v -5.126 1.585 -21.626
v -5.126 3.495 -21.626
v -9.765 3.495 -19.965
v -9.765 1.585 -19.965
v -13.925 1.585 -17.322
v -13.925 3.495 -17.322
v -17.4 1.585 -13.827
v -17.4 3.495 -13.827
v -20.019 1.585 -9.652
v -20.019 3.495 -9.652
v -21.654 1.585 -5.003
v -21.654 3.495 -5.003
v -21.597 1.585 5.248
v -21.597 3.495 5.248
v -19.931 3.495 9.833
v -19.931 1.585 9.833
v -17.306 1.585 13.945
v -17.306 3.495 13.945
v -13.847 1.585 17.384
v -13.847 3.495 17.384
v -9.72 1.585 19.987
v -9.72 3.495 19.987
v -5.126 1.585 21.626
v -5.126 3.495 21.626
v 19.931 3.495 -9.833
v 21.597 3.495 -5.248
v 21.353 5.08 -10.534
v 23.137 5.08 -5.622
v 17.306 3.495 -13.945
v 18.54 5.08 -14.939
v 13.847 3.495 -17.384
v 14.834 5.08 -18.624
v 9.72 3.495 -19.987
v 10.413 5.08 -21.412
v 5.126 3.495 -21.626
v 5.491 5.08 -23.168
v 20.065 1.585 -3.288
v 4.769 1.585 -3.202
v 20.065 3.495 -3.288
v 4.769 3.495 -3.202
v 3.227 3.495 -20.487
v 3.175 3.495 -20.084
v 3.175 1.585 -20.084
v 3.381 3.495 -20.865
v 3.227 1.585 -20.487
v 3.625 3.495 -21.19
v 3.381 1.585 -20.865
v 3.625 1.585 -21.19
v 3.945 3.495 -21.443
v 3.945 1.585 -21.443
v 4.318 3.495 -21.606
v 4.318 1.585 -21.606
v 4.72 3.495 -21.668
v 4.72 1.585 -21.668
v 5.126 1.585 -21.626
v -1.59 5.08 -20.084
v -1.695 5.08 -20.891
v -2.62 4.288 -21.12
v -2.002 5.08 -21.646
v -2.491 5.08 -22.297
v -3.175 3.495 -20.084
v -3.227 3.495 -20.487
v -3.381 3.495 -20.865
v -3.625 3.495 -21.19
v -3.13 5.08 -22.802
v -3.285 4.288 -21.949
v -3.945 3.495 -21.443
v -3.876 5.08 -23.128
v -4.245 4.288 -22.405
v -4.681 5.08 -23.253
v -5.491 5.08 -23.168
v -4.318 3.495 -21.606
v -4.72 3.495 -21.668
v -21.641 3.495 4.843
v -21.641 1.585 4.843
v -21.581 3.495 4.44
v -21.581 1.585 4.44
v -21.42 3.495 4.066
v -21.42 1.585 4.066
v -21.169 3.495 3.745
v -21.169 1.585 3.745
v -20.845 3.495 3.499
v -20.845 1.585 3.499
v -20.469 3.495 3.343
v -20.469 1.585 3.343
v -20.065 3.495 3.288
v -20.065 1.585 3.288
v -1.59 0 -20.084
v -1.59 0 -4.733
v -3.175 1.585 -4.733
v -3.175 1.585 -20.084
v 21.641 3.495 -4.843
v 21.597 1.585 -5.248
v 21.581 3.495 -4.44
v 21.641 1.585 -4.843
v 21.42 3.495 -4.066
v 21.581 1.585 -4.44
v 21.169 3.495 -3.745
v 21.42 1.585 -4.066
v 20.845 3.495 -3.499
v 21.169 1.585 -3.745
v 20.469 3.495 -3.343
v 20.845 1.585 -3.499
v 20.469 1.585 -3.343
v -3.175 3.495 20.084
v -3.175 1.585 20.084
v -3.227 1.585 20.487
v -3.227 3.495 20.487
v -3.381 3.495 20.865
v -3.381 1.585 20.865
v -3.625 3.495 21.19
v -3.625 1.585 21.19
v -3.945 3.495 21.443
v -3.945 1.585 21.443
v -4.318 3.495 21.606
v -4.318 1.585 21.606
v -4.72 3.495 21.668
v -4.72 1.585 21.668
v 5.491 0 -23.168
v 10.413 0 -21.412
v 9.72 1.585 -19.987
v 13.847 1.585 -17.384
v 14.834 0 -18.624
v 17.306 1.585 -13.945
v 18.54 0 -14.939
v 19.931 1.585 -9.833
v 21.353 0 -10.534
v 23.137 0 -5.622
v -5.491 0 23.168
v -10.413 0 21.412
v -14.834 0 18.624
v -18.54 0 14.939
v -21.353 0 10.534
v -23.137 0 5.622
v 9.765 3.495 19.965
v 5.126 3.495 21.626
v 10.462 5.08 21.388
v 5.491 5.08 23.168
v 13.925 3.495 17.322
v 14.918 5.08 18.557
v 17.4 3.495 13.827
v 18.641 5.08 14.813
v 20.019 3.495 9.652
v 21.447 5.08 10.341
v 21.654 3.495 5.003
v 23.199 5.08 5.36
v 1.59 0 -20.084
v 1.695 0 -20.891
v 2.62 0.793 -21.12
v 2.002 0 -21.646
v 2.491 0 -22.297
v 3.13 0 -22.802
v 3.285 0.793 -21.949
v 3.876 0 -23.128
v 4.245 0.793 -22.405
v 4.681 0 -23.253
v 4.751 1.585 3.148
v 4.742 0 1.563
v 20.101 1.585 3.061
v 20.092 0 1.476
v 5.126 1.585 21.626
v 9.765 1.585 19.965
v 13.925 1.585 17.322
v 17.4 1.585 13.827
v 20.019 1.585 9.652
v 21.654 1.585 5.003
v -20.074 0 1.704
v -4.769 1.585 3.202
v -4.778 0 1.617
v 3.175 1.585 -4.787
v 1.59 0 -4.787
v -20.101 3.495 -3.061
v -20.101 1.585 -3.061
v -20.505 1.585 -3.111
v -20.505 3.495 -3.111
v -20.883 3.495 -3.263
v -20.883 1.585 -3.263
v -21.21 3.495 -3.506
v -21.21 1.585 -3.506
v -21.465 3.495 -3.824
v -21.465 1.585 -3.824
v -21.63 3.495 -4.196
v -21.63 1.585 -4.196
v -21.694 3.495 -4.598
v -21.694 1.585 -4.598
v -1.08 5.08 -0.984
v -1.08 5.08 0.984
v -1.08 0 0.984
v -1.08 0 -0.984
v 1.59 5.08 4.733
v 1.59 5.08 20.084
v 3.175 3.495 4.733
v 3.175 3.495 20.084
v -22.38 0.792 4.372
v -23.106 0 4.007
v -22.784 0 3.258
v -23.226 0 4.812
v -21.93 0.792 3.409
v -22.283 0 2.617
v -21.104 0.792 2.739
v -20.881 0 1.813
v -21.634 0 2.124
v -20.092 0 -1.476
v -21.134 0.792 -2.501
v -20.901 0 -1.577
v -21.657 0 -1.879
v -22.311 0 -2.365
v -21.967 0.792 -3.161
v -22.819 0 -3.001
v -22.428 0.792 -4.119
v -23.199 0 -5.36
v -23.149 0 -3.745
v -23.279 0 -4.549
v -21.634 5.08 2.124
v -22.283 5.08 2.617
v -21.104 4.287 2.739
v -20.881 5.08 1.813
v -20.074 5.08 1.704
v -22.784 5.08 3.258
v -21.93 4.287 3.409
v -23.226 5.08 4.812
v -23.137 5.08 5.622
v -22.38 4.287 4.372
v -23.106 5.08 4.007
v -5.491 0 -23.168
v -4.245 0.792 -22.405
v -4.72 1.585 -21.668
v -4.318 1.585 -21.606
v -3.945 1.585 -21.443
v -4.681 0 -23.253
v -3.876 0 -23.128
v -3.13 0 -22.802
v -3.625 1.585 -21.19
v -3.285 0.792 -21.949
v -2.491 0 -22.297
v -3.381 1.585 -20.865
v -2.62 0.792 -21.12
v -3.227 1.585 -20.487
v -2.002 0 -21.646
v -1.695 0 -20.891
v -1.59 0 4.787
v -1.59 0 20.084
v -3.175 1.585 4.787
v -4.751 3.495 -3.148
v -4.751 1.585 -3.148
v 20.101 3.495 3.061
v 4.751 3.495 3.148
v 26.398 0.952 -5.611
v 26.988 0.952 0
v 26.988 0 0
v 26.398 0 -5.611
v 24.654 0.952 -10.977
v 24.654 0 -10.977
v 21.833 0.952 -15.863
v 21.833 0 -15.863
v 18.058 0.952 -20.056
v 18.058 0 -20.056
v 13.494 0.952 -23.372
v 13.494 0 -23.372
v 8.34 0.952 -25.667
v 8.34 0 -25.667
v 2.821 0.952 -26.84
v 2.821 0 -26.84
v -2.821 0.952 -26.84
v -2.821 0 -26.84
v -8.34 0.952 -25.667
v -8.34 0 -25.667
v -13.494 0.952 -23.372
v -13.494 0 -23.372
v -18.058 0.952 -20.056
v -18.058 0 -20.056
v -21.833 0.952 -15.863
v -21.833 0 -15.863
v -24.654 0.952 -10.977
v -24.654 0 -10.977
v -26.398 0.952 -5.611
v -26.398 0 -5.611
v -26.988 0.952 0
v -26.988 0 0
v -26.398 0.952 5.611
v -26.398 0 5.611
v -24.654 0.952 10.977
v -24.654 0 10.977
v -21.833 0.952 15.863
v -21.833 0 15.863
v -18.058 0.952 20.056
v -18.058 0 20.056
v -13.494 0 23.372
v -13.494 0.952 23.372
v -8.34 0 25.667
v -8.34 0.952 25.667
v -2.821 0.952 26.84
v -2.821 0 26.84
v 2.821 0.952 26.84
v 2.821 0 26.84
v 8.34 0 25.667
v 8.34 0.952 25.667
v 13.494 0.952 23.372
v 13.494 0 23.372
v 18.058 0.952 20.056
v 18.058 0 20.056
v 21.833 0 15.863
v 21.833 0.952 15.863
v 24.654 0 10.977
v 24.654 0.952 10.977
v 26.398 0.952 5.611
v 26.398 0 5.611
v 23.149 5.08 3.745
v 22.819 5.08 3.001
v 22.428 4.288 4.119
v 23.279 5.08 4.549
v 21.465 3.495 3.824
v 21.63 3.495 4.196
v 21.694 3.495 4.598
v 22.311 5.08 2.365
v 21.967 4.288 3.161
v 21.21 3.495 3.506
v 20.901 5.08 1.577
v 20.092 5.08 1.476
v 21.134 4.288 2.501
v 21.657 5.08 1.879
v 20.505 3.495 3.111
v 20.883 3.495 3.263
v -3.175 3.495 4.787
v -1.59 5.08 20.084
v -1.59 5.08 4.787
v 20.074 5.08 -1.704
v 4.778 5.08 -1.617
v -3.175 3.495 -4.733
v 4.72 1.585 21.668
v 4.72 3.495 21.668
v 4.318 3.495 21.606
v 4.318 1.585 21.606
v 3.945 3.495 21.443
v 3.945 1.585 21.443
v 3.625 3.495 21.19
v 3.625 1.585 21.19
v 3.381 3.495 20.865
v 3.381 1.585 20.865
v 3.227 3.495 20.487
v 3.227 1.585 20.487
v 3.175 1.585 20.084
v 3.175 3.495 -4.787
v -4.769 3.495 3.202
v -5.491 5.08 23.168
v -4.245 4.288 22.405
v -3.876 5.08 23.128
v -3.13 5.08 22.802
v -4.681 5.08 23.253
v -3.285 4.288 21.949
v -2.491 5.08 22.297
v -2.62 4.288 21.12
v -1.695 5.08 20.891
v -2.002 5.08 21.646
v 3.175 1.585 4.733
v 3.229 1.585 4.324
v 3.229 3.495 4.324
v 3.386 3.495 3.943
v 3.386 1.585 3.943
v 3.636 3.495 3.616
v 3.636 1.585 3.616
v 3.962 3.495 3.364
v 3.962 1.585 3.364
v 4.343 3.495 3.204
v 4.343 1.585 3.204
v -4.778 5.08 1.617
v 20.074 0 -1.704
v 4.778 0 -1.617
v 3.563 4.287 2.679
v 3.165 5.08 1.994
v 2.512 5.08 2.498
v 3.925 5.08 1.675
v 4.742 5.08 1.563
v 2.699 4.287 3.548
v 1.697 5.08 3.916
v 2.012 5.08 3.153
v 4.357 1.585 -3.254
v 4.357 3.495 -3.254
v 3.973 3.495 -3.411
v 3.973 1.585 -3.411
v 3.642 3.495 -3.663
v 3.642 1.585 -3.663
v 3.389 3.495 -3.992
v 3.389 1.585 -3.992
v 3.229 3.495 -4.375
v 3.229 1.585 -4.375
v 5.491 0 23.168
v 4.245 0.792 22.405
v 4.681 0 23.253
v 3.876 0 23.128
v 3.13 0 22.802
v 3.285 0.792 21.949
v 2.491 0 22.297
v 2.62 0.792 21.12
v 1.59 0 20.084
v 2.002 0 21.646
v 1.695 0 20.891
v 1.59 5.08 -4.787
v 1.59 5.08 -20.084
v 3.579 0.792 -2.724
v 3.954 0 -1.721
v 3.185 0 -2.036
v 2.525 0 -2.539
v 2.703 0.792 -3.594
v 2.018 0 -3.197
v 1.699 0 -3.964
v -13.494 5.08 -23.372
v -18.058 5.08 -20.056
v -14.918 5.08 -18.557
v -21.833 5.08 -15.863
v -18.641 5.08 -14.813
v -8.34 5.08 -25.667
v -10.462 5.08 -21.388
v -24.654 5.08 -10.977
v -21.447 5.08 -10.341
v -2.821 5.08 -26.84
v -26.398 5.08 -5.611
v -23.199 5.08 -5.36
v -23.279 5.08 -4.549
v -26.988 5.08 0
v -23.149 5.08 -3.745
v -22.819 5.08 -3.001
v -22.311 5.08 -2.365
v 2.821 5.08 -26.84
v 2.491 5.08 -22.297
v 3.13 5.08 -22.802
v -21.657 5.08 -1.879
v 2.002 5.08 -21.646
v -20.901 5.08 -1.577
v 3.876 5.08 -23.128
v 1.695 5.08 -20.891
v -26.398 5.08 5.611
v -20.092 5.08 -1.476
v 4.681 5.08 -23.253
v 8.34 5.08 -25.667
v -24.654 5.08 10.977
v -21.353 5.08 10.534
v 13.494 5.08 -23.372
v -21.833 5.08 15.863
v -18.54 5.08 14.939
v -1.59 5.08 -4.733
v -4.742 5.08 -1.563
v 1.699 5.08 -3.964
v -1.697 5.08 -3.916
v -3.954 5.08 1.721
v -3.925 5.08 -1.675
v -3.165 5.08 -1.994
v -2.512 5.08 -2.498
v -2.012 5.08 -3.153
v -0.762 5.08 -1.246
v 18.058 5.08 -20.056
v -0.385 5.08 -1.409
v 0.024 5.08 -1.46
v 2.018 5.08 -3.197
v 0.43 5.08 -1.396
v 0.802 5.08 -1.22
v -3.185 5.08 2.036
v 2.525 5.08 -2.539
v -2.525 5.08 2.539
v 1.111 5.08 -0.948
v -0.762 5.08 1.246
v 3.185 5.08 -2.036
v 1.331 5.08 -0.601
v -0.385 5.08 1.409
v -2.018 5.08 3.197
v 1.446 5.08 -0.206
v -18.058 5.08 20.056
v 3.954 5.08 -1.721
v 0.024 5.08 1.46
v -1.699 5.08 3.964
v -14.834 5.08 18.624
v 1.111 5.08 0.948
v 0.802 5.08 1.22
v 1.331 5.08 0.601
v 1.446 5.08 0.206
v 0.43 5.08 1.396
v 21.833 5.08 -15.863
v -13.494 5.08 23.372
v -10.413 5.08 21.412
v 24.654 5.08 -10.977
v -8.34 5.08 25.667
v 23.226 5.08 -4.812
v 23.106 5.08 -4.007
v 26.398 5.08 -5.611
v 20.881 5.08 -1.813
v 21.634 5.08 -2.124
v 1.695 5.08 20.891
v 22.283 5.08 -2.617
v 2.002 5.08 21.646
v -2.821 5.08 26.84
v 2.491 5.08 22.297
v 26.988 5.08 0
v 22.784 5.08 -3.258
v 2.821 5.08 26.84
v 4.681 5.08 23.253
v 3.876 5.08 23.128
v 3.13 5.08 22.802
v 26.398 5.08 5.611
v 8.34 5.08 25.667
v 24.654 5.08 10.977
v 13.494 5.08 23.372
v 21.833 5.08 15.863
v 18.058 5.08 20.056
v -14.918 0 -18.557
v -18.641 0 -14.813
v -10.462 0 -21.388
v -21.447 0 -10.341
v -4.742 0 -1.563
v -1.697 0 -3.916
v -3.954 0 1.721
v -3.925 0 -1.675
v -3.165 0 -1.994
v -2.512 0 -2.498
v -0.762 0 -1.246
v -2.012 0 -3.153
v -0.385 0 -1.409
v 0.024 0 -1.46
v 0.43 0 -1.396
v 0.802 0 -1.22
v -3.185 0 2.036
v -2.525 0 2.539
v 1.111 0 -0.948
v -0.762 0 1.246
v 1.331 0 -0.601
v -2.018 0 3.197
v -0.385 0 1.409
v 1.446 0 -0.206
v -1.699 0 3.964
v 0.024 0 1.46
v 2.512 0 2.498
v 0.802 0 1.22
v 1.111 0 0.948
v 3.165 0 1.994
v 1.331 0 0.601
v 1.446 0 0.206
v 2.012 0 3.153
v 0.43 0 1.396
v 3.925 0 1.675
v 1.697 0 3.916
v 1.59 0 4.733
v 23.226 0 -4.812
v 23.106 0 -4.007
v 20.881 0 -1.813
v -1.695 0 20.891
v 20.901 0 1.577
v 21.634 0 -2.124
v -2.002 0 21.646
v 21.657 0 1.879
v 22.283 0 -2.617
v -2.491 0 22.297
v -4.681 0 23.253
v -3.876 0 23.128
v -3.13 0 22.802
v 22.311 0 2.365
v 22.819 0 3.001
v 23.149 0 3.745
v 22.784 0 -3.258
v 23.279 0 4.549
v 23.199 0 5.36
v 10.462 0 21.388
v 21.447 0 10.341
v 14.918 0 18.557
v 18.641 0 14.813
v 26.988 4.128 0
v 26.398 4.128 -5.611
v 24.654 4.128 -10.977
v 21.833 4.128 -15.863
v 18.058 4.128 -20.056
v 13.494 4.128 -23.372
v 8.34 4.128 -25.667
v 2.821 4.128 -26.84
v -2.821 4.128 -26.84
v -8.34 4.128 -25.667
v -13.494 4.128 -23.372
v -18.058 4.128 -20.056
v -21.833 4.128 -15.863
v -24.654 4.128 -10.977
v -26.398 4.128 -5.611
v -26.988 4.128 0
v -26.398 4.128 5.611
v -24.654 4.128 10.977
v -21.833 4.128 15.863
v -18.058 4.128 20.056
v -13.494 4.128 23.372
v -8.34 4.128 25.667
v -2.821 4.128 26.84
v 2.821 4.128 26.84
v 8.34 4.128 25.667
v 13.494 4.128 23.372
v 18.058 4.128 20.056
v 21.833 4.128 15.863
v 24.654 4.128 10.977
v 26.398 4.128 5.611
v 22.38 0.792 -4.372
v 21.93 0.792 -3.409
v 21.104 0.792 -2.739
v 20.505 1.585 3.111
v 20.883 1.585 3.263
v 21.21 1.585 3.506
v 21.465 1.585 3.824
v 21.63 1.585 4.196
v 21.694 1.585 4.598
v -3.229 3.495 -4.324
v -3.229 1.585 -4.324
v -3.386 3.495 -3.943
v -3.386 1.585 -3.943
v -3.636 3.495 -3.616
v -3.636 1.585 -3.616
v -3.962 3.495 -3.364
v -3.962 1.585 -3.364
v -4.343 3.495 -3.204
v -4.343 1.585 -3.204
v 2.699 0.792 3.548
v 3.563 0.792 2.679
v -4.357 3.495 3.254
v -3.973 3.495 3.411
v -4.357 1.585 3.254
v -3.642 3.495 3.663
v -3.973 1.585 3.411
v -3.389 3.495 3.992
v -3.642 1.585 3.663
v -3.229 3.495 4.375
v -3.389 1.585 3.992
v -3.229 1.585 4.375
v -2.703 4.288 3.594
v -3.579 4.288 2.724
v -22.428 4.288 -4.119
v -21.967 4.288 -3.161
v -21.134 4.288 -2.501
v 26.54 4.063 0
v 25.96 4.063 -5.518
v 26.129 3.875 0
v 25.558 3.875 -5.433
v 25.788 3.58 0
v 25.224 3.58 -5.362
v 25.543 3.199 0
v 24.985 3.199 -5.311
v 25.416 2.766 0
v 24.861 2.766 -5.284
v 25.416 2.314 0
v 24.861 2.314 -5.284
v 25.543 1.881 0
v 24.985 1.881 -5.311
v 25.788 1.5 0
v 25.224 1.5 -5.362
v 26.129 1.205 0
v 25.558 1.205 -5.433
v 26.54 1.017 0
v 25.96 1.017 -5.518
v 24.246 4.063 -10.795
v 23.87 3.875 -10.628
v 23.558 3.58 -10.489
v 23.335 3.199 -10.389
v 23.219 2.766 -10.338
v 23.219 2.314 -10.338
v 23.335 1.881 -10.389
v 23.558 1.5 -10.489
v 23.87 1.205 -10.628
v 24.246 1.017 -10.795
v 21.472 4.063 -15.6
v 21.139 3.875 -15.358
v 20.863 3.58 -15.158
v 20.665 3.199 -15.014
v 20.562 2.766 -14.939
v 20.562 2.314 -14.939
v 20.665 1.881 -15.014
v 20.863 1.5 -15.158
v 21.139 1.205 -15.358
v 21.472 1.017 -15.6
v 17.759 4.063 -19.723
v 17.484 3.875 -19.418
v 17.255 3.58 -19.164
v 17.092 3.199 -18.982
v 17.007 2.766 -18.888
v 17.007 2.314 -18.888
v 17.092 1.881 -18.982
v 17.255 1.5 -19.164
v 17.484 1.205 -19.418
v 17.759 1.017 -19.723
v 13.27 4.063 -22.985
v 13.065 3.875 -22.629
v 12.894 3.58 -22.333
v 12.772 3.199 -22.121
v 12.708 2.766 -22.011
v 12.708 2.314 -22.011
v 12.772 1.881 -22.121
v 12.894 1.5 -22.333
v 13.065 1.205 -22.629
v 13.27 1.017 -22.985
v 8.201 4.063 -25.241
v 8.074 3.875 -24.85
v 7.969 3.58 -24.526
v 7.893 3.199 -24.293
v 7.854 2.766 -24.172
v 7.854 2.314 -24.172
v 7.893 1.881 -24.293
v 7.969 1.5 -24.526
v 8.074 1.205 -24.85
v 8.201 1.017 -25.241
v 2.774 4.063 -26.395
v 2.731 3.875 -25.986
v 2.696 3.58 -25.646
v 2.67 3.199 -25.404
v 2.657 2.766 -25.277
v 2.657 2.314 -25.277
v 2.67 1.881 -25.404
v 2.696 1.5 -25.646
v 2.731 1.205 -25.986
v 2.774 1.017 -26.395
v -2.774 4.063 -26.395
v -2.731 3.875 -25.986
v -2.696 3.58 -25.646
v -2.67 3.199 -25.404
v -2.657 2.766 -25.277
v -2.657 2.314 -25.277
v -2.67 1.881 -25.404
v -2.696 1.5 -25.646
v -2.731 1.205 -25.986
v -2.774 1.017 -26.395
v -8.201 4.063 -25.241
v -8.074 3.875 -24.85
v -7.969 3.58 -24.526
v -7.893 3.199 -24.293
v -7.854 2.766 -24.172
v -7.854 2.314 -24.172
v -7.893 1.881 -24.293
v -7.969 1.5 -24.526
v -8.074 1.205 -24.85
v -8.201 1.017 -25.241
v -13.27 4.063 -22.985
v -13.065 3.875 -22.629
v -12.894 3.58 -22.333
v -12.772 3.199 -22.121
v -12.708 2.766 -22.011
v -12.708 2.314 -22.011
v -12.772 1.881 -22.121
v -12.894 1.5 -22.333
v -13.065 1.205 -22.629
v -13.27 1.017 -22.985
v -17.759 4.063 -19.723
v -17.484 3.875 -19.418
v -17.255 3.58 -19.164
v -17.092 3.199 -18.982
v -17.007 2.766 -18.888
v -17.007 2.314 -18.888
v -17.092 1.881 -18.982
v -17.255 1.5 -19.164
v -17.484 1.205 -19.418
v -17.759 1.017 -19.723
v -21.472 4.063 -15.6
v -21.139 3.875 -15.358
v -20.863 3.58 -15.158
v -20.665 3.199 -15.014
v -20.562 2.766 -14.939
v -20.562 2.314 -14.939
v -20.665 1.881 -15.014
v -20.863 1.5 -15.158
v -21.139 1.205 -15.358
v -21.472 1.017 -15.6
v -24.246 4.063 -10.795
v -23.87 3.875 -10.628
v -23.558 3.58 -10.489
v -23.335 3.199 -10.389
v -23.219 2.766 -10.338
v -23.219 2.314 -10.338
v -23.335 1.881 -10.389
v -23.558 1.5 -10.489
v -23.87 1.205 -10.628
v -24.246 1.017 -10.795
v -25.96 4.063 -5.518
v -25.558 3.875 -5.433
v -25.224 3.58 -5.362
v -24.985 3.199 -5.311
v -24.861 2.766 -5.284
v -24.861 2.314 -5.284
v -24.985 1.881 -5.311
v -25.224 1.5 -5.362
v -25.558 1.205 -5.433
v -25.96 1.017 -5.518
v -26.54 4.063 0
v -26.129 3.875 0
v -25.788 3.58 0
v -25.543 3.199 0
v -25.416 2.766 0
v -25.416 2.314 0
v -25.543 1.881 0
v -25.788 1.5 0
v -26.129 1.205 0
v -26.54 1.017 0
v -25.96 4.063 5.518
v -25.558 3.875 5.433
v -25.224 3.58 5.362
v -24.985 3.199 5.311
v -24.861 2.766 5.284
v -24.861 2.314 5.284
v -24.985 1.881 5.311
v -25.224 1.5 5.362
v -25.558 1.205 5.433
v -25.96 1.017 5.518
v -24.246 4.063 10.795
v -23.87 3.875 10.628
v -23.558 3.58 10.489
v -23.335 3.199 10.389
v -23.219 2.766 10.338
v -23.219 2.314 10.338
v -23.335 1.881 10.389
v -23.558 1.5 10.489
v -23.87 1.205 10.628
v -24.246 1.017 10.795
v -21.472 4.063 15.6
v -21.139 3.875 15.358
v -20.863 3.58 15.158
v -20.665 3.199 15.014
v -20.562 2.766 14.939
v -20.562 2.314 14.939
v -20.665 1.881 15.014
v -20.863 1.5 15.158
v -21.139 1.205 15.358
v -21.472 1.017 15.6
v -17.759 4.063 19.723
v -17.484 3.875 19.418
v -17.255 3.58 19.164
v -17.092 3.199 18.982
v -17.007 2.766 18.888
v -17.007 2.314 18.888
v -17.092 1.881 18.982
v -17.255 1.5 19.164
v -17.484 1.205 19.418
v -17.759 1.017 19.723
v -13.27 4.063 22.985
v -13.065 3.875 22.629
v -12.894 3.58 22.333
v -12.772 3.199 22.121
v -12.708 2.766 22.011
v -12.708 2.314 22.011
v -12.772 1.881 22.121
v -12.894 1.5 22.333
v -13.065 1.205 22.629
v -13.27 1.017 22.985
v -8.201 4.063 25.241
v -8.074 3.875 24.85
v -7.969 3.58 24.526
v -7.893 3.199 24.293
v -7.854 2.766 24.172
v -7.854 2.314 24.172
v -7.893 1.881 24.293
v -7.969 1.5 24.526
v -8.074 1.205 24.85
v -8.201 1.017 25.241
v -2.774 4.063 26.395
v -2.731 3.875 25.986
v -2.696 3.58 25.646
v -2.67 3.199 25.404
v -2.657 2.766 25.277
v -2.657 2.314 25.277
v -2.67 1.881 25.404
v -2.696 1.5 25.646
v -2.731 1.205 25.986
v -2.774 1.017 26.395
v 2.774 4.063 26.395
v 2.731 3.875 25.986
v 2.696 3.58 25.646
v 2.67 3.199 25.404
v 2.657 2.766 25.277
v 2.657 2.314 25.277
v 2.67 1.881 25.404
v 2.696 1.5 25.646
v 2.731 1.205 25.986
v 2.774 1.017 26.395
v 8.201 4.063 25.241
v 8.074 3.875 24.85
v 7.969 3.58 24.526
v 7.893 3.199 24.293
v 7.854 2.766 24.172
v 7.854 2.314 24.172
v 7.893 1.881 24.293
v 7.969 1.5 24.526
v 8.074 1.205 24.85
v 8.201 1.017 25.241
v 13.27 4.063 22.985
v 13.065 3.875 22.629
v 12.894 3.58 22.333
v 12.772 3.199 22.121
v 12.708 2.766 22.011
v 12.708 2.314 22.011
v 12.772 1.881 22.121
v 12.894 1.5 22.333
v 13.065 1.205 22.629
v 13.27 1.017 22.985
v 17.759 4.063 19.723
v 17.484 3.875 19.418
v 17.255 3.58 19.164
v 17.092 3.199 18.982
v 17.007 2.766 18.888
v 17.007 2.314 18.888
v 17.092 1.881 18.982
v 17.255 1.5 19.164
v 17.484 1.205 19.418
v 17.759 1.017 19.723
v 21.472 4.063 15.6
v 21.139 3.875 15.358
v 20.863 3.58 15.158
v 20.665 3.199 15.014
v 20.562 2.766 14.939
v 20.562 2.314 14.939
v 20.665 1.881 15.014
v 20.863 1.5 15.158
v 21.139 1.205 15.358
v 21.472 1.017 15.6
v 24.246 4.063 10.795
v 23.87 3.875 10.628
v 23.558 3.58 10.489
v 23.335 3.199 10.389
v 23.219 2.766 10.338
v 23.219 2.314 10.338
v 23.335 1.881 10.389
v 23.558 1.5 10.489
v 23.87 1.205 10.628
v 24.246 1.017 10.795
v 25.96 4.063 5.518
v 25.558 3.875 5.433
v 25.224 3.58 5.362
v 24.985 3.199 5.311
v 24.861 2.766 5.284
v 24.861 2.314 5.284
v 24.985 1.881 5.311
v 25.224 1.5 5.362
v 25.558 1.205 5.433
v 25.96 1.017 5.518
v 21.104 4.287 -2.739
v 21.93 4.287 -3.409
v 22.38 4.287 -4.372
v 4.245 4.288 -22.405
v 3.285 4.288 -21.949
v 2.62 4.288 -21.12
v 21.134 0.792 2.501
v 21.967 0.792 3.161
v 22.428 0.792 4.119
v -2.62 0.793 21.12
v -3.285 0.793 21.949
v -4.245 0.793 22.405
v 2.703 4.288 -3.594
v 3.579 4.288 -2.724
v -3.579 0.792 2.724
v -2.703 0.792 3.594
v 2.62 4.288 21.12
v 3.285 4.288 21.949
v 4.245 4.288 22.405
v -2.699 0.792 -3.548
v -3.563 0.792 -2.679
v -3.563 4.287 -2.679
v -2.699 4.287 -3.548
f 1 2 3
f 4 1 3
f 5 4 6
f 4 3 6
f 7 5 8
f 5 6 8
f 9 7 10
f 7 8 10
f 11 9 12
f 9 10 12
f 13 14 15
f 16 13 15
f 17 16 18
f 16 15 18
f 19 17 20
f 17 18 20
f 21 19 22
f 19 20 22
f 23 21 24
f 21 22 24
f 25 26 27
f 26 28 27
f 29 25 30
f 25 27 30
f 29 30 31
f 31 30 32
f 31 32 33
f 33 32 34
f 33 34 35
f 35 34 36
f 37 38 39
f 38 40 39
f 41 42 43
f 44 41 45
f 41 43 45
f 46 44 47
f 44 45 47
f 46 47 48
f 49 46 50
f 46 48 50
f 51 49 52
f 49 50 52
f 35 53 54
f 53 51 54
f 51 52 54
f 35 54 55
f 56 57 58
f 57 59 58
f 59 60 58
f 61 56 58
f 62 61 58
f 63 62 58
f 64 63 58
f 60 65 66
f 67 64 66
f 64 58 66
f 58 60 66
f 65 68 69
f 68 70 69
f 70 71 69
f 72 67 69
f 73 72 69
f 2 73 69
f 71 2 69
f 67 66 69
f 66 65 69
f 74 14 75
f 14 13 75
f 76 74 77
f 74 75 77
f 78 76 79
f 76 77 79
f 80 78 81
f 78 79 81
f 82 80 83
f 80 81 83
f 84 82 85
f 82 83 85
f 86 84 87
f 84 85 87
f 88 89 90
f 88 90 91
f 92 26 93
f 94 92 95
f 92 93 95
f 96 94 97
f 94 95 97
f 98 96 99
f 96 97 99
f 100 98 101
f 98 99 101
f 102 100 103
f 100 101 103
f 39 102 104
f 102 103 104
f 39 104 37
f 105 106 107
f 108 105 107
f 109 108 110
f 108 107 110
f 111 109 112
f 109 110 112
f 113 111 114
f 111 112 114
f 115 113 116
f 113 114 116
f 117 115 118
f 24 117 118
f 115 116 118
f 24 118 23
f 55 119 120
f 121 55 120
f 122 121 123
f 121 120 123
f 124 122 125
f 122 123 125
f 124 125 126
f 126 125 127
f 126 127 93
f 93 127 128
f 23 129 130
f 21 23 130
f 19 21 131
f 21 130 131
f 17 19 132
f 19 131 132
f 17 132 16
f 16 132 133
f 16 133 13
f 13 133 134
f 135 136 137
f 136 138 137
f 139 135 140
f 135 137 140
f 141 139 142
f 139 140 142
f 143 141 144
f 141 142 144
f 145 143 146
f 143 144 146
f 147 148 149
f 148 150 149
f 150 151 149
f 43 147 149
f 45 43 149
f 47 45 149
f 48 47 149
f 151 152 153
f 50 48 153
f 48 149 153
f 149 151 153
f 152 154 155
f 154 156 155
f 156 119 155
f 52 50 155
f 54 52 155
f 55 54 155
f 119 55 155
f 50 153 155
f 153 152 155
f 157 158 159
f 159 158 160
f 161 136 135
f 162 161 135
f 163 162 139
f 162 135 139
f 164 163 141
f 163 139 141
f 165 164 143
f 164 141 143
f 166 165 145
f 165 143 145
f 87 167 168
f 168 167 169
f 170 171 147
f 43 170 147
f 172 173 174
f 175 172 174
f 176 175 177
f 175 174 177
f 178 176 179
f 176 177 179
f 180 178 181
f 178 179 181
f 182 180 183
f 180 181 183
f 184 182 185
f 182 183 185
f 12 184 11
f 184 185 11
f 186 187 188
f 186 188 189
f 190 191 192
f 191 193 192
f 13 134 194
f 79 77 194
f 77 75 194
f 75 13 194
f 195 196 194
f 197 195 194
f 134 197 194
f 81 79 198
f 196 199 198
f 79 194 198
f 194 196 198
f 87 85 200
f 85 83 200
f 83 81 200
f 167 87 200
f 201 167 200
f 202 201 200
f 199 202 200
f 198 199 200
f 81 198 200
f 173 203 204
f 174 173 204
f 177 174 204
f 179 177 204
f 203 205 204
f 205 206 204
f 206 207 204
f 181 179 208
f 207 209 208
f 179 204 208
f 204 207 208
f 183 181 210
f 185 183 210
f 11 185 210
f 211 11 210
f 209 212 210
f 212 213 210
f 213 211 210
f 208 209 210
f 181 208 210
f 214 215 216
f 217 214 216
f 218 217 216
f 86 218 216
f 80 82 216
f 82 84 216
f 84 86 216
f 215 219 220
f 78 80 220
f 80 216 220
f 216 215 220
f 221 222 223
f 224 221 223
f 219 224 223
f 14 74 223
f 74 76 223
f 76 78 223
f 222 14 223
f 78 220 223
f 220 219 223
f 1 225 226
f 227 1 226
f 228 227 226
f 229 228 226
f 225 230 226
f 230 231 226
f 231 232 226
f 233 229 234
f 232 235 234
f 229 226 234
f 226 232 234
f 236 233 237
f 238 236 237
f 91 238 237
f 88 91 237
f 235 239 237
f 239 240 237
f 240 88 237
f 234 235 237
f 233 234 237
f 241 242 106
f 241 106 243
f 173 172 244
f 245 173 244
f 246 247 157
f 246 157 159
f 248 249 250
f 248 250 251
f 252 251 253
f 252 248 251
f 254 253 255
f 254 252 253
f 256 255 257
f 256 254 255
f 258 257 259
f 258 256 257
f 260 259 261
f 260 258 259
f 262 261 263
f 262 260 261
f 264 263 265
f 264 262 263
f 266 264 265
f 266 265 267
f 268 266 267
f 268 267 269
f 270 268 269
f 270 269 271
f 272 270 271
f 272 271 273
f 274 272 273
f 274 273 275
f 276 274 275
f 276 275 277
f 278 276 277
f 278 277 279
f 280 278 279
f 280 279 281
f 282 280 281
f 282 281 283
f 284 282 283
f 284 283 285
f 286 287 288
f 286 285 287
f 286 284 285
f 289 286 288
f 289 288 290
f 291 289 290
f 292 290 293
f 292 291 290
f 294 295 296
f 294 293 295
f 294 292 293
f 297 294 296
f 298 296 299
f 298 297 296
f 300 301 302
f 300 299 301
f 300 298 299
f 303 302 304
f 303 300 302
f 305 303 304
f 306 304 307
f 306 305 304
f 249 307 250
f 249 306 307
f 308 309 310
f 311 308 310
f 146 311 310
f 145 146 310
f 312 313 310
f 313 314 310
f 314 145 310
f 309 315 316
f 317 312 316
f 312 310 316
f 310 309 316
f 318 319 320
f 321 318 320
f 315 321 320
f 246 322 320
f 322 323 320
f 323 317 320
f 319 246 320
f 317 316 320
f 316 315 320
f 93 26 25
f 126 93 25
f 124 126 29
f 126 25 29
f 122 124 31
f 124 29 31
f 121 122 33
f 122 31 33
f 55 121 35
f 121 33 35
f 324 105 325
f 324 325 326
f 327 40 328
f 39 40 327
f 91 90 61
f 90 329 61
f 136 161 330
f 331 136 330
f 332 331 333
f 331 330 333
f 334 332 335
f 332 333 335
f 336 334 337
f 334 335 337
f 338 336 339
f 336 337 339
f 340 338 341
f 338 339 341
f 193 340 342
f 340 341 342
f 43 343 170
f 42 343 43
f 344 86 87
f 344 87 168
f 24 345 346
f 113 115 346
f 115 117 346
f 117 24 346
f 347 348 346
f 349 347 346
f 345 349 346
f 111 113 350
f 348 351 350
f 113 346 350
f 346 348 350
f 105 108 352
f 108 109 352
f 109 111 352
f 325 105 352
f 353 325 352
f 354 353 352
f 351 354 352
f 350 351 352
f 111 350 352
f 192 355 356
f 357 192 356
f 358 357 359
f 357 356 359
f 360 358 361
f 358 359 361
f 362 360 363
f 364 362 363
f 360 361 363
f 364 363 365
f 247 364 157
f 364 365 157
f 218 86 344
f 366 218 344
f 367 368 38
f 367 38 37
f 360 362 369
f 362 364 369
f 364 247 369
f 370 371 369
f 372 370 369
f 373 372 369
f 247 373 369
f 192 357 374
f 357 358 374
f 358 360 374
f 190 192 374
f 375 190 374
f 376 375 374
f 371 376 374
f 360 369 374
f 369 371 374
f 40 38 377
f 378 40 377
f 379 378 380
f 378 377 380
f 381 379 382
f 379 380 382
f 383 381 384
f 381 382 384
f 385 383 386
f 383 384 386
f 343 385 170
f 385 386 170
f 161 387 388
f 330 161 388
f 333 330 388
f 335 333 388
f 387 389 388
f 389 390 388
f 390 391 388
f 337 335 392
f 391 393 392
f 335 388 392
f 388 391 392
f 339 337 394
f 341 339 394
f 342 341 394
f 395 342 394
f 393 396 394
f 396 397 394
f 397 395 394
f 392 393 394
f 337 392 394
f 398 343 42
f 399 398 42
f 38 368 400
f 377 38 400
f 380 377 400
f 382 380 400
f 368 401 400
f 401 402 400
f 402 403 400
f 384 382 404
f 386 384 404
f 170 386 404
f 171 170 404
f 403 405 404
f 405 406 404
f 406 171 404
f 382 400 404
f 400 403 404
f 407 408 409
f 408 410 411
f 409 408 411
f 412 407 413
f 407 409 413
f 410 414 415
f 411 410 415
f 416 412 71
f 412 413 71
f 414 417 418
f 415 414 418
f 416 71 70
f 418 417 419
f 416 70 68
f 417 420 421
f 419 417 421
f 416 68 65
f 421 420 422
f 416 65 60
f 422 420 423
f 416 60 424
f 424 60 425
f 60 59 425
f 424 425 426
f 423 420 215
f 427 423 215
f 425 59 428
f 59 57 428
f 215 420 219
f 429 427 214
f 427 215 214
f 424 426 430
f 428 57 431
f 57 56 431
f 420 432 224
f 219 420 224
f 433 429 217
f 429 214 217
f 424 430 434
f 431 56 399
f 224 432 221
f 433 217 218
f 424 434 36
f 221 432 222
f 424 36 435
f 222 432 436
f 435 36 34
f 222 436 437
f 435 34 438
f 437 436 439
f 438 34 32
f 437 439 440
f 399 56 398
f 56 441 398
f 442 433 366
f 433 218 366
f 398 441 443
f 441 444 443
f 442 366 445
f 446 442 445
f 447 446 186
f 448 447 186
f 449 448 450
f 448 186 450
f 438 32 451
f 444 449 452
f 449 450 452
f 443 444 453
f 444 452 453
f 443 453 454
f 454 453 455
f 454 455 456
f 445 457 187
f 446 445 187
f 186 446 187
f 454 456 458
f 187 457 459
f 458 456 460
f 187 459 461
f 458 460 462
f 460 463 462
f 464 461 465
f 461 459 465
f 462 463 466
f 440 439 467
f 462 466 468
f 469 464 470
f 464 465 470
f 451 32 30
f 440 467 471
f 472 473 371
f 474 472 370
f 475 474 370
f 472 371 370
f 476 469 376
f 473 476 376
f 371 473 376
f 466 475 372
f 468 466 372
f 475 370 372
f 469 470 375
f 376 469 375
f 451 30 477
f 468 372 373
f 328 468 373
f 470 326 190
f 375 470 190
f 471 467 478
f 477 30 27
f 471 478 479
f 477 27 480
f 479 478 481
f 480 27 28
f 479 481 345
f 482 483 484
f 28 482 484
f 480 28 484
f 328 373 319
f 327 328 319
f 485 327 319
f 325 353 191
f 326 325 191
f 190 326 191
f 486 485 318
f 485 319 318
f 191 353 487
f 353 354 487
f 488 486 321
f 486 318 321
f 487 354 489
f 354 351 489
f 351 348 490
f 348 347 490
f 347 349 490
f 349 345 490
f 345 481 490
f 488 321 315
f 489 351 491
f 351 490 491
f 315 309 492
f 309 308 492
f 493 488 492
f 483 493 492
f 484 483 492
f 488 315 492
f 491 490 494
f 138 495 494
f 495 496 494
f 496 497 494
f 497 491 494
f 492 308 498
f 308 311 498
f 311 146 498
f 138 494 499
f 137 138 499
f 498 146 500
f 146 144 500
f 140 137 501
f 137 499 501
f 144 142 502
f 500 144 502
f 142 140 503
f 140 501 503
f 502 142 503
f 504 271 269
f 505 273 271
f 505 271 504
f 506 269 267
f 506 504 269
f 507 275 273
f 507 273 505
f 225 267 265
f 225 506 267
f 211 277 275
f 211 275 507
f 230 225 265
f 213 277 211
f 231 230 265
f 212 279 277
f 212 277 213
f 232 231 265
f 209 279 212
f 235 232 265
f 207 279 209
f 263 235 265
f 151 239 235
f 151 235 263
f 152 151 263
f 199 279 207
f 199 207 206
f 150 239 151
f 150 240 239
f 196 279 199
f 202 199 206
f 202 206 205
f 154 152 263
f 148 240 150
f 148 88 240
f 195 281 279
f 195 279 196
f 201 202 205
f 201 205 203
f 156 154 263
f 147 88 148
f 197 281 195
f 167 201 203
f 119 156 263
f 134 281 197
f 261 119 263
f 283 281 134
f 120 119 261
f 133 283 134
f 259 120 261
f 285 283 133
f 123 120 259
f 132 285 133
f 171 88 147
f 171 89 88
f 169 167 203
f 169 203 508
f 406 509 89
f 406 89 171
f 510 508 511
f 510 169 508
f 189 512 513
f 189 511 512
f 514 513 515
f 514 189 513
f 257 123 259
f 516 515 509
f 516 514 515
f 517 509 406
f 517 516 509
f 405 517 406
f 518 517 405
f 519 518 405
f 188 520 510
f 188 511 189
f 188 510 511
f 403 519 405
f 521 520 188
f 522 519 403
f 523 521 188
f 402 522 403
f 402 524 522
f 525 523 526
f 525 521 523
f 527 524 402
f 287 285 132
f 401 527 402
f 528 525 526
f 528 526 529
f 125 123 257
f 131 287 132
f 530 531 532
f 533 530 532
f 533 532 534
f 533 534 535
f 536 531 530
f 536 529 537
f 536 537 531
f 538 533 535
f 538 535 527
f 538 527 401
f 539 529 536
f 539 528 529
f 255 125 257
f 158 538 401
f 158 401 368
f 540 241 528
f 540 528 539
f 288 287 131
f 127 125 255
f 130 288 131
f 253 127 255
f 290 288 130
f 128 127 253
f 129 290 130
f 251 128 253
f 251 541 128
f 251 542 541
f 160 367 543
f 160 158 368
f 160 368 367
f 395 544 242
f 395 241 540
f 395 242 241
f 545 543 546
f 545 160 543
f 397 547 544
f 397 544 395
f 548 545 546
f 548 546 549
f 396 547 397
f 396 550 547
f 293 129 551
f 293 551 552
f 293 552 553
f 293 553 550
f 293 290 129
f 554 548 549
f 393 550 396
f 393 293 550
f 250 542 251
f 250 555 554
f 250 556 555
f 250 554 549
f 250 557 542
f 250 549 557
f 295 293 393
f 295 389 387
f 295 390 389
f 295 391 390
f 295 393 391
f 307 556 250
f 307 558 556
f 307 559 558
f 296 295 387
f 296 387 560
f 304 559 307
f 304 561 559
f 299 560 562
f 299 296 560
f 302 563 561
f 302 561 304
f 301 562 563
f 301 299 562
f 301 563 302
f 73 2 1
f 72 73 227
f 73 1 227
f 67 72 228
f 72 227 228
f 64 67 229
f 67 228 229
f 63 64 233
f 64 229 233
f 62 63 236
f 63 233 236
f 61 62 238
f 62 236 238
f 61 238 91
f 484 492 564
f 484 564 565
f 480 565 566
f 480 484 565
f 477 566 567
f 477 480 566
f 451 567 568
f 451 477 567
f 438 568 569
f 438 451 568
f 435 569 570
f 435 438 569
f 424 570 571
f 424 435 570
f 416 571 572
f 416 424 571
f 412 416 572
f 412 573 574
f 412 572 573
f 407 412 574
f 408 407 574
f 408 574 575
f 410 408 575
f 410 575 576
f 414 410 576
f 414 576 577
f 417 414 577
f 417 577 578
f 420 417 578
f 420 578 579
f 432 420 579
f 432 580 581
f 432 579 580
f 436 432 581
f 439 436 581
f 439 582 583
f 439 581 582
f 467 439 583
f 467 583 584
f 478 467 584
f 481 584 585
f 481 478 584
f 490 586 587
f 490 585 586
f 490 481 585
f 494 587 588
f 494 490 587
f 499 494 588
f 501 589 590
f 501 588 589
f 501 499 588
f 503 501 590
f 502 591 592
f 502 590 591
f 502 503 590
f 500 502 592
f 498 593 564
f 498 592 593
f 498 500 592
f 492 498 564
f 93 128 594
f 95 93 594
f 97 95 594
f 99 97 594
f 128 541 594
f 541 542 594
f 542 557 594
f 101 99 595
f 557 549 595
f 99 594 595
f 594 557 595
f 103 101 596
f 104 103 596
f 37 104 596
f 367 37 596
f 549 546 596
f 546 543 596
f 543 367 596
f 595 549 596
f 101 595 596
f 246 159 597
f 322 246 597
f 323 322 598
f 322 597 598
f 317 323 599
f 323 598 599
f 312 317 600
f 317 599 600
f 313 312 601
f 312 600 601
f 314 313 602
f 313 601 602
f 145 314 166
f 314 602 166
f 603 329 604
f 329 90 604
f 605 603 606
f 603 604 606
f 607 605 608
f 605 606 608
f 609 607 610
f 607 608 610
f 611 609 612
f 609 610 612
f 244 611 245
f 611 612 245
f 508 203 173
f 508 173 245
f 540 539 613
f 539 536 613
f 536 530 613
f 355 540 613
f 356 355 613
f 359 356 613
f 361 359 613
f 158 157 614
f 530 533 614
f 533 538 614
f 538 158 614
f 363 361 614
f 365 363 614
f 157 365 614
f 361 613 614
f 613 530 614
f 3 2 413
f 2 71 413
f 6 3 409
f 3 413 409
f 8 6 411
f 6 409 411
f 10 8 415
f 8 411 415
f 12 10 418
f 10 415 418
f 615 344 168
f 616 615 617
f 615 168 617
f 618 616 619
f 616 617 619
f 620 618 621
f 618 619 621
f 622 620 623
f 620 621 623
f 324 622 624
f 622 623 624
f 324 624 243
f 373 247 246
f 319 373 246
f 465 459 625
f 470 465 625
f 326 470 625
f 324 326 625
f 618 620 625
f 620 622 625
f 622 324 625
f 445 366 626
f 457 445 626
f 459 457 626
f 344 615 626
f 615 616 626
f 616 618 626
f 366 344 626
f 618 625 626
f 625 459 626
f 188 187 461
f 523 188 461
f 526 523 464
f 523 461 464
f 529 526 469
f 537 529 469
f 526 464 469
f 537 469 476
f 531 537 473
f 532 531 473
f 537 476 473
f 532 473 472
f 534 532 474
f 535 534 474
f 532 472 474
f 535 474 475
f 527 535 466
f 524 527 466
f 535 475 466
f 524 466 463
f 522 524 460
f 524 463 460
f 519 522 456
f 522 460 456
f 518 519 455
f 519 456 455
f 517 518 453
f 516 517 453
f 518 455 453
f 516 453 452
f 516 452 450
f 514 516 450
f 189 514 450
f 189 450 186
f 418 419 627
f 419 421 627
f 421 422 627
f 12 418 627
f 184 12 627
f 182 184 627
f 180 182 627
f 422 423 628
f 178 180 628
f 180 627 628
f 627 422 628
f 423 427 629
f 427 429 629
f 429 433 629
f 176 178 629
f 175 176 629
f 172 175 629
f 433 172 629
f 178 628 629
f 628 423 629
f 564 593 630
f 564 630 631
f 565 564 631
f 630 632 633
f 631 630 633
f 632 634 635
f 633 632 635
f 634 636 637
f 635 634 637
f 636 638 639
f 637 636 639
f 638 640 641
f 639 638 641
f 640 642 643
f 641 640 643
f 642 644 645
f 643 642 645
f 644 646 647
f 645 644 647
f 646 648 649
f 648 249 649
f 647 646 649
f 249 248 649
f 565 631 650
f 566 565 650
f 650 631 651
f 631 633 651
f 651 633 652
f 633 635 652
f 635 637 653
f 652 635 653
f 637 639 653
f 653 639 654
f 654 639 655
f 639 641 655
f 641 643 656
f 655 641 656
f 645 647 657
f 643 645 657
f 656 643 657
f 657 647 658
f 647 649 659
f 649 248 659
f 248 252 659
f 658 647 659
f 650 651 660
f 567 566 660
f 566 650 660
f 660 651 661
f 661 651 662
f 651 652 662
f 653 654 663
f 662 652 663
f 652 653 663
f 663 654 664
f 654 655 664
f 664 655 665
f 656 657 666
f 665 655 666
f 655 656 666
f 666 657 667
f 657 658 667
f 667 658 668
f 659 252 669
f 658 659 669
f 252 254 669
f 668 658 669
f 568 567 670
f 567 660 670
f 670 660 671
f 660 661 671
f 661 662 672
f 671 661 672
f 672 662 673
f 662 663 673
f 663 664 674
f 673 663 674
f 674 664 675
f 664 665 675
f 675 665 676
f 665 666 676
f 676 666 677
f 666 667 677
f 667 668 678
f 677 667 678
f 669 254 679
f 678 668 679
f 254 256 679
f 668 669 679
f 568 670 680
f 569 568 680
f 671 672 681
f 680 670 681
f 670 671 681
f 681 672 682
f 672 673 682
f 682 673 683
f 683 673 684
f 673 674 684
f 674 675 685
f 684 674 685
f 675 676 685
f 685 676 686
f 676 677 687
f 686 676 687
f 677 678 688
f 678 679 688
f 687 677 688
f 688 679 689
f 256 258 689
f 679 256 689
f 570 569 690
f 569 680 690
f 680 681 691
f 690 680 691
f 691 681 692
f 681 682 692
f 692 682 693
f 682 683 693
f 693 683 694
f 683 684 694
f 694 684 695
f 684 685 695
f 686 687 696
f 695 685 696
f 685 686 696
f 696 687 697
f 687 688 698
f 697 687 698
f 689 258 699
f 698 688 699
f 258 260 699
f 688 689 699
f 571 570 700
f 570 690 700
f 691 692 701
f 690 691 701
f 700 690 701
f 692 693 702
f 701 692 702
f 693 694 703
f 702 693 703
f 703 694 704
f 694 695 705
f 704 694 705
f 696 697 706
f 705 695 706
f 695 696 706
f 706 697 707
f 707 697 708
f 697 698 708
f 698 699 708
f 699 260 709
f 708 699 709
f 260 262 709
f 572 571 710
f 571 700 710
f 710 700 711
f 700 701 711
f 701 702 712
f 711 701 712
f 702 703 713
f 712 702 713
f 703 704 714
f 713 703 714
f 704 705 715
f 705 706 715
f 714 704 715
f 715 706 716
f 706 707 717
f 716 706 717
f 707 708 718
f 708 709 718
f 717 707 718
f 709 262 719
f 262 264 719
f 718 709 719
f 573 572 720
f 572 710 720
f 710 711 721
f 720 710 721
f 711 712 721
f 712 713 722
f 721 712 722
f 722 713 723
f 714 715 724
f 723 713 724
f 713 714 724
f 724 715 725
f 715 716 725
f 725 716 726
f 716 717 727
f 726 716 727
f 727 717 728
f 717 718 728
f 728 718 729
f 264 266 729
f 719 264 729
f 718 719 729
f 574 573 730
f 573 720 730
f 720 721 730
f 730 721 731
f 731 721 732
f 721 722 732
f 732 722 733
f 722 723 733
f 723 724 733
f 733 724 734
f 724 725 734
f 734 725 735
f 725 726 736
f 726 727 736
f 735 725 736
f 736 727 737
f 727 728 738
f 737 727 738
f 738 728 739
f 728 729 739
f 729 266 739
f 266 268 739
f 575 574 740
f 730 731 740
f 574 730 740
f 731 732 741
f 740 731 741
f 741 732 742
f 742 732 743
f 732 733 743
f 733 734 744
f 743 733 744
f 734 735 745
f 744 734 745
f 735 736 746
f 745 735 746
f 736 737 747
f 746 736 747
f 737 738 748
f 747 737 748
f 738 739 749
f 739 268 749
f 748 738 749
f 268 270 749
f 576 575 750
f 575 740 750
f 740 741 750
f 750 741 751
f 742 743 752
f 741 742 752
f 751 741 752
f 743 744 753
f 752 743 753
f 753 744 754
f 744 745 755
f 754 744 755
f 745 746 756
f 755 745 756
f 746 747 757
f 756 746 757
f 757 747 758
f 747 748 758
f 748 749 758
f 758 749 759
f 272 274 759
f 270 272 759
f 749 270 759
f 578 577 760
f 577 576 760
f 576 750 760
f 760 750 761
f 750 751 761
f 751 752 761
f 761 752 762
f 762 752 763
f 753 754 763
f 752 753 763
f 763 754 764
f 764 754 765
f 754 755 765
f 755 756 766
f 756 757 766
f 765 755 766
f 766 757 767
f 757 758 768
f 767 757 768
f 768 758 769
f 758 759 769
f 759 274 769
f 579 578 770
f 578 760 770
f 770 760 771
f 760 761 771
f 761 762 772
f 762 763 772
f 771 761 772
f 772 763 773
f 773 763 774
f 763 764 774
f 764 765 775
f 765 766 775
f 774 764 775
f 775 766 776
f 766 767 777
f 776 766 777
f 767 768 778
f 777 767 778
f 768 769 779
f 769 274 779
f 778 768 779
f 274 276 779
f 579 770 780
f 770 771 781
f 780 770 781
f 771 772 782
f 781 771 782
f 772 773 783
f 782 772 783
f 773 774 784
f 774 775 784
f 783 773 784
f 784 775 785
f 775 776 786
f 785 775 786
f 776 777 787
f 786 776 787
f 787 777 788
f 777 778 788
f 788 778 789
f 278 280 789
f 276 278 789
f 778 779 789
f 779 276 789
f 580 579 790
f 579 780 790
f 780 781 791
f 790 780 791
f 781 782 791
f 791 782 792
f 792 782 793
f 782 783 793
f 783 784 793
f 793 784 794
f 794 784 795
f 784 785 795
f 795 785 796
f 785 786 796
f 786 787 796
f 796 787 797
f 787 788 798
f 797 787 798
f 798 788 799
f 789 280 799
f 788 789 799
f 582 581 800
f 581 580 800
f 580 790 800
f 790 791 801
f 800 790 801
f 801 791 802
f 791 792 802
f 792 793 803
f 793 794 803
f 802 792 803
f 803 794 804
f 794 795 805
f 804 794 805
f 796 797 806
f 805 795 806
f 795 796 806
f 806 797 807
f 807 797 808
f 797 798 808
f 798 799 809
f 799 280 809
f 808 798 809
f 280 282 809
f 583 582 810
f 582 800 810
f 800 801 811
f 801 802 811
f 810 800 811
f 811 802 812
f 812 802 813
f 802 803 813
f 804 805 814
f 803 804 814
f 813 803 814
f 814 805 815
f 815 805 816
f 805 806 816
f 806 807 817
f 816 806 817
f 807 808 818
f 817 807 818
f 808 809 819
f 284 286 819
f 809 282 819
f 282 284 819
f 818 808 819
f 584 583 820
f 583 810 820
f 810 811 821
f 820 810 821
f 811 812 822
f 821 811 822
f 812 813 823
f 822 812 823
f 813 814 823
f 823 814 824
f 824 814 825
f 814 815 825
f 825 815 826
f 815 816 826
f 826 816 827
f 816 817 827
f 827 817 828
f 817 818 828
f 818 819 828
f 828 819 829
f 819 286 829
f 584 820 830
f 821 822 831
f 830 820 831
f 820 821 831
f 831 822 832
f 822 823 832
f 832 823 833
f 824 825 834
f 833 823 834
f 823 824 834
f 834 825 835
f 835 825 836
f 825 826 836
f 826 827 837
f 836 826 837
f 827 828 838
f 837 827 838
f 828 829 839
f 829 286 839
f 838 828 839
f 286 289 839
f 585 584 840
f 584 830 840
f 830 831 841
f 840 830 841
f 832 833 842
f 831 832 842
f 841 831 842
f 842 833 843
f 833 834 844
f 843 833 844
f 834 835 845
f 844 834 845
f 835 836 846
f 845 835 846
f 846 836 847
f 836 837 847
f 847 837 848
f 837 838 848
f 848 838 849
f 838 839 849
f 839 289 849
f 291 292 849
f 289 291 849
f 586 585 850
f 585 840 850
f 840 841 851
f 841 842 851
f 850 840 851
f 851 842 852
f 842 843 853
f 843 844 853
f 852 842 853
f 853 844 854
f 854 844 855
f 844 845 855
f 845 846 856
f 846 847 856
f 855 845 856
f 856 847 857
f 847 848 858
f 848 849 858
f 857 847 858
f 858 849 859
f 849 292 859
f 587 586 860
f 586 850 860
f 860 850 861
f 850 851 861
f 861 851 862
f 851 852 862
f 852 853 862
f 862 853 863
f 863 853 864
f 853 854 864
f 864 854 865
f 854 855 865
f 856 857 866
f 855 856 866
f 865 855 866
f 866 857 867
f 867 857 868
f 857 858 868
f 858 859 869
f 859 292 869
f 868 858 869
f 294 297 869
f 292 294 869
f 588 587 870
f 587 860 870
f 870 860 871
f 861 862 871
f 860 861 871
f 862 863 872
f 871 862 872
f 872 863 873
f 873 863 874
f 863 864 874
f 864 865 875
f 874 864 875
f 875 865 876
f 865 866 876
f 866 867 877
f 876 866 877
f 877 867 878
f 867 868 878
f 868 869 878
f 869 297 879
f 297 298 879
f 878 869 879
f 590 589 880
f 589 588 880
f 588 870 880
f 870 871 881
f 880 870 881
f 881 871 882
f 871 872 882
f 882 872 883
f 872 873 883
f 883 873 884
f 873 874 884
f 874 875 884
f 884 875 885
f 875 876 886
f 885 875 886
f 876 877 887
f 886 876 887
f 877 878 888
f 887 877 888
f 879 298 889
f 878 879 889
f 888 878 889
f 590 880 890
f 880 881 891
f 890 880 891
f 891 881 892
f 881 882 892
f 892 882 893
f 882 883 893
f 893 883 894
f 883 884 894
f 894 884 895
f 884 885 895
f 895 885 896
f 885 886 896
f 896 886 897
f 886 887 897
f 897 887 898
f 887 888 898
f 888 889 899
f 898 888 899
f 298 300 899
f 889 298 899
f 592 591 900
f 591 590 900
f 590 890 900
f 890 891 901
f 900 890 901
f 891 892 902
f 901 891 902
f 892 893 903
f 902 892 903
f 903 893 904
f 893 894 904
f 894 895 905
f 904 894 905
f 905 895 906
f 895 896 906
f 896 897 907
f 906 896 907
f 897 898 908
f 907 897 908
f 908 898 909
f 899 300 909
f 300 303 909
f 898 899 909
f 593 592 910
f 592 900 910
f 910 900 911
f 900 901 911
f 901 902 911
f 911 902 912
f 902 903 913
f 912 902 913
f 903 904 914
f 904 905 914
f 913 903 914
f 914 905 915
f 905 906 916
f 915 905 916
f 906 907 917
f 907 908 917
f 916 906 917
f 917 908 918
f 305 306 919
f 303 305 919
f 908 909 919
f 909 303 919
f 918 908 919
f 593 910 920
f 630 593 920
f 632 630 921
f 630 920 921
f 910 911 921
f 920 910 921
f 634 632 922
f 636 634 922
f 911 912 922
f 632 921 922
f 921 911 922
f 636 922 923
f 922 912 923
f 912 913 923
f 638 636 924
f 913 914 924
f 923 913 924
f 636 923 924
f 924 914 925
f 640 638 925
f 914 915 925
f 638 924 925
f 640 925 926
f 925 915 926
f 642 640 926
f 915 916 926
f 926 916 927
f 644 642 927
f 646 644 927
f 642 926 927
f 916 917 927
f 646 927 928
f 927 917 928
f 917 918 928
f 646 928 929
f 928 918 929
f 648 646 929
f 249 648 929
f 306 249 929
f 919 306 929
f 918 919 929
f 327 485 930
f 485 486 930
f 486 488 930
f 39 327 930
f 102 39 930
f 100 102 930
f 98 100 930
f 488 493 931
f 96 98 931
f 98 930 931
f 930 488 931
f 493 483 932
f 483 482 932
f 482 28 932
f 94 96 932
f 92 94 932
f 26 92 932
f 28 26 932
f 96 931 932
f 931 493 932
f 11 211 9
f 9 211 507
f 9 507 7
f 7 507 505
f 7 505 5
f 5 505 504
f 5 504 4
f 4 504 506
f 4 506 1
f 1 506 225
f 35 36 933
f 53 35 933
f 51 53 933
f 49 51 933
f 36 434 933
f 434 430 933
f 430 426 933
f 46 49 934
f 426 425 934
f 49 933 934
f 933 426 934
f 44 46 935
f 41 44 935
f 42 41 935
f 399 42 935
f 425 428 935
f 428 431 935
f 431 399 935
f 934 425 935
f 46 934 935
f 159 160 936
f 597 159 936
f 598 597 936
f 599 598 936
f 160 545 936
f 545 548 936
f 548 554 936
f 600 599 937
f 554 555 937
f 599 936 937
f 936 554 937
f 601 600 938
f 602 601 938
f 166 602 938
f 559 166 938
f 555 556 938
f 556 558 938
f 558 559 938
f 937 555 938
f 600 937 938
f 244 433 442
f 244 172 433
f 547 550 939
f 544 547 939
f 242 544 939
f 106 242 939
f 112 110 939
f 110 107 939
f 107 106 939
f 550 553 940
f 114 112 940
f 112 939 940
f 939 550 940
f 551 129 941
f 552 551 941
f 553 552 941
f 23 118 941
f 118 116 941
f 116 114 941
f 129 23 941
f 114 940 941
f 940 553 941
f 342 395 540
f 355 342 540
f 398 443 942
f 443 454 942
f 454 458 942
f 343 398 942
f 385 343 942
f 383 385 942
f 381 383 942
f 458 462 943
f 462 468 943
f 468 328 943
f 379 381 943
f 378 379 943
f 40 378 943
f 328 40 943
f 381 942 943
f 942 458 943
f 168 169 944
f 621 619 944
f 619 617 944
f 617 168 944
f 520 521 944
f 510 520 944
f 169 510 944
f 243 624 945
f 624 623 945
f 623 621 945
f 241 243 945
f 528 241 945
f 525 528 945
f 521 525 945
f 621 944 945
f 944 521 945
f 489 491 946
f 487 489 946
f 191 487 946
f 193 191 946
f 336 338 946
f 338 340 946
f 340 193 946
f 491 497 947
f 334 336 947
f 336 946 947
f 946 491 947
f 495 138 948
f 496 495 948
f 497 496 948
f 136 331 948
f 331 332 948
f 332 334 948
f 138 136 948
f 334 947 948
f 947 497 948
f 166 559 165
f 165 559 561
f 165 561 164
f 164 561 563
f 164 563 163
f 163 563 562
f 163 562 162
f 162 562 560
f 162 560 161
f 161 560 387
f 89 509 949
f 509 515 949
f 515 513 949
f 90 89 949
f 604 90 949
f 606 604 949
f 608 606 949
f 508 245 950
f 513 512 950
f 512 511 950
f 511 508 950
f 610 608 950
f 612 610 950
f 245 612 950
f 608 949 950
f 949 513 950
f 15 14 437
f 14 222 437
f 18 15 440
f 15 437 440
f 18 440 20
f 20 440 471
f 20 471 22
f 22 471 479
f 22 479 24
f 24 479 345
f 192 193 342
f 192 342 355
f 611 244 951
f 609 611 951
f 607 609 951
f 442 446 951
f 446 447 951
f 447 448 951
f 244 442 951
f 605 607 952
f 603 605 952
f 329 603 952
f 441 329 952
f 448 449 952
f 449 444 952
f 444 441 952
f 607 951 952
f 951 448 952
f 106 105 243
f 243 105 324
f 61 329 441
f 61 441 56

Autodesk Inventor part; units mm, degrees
ref_plane "YZ Plane" through (0, 0, 0) normal (1, 0, 0) x (0, 1, 0)
ref_plane "XZ Plane" through (0, 0, 0) normal (0, 1, 0) x (-1, 0, 0)
ref_plane "XY Plane" through (0, 0, 0) normal (0, 0, 1) x (1, 0, 0)
sketch "Sketch1" plane through (0, 0, 0) normal (0, 0, 1) x (1, 0, 0)
  line L0 (0, 0) -> (26.9875, 0)
  line L1 (26.9875, 5.08) -> (0, 5.08)
  line L2 (0, 5.08) -> (0, 0)
  arc A0 (26.9875, 4.1275) -> (26.9875, 0.9525) centre (26.9875, 2.54) ccw
  line L3 (26.9875, 0) -> (26.9875, 0.9525)
  line L4 (26.9875, 4.1275) -> (26.9875, 5.08)
  dimension "d0" = 5.08
  dimension "d1" = 26.9875
  dimension "d2" = 3.175
revolve "Revolution1" add sketch "Sketch1" angle 360 about axis through (0, 5.08, 0) along (0, -1, 0)
sketch "Sketch2" plane through (0, 5.08, 0) normal (0, 1, 0) x (1, 0, 0)
  line L0 (-22.0146, 3.0506) -> (-3.175, 3.1571)
  line L1 (3.175, 3.193) -> (21.9787, 3.2993)
  line L2 (-3.175, -21.997) -> (-3.175, -3.193)
  line L3 (-3.175, 3.1571) -> (-3.175, 21.997)
  arc A0 (-3.175, 21.997) -> (-22.0146, 3.0506) centre (0, 0) ccw
  line L4 (-21.9787, -3.2993) -> (-3.175, -3.193)
  line L5 (3.175, -3.1571) -> (22.0146, -3.0506)
  arc A1 (-21.9787, -3.2993) -> (-3.175, -21.997) centre (0, 0) ccw
  line L6 (3.175, -21.997) -> (3.175, -3.1571)
  line L7 (3.175, 3.193) -> (3.175, 21.997)
  arc A2 (3.175, -21.997) -> (22.0146, -3.0506) centre (0, 0) ccw
  arc A3 (21.9787, 3.2993) -> (3.175, 21.997) centre (0, 0) ccw
extrude "Extrusion1" cut sketch "Sketch2" against normal blind 25.4
sketch "Sketch3" plane through (0, 5.08, 0) normal (0, 1, 0) x (1, 0, 0)
  arc A0 (-1.0795, -0.9837) -> (-1.0795, 0.9837) centre (0, 0) ccw
  line L0 (-1.0795, -0.9837) -> (-1.0795, 0.9837)
  dimension "d11" = 2.921
  dimension "d12" = 1.0795
extrude "Extrusion2" cut sketch "Sketch3" against normal blind 25.4
fillet "Fillet1" radius 1.585 12 edges at (-3.175, 2.54, -3.1571) (3.175, 2.54, -3.193) (3.175, 2.54, 3.1571) (-3.175, 2.54, 3.193) (-21.9787, 2.54, 3.2993) (-3.175, 2.54, 21.997) (3.175, 2.54, 21.997) (22.0146, 2.54, 3.0506) (21.9787, 2.54, -3.2993) (3.175, 2.54, -21.997) (-3.175, 2.54, -21.997) (-22.0146, 2.54, -3.0506)
chamfer "Chamfer1" distance 1.585 angle 45 48 edges at (-12.4262, 5.08, -3.1048) (-21.348, 5.08, -3.6563) (-15.7598, 5.08, -15.671) (-3.7769, 5.08, -21.3269) (-3.175, 5.08, -12.4084) (-3.6361, 5.08, -3.6156) (-12.4172, 5.08, 3.2453) (-3.6424, 5.08, 3.6631) (-3.175, 5.08, 12.4353) (-3.7769, 5.08, 21.3269) (-15.671, 5.08, 15.7598) (-21.3052, 5.08, 3.8974) (12.4262, 5.08, 3.1048) (21.348, 5.08, 3.6563) (15.7598, 5.08, 15.671) (3.7769, 5.08, 21.3269) (3.175, 5.08, 12.4084) (3.6361, 5.08, 3.6156) (12.4172, 5.08, -3.2453) (3.6424, 5.08, -3.6631) (3.175, 5.08, -12.4353) (3.7769, 5.08, -21.3269) (15.671, 5.08, -15.7598) (21.3052, 5.08, -3.8974) (-3.6361, 0, -3.6156) (-12.4262, 0, -3.1048) (-21.348, 0, -3.6563) (-15.7598, 0, -15.671) (-3.7769, 0, -21.3269) (-3.175, 0, -12.4084) (-3.175, 0, 12.4353) (-3.6424, 0, 3.6631) (-12.4172, 0, 3.2453) (-21.3052, 0, 3.8974) (-15.671, 0, 15.7598) (-3.7769, 0, 21.3269) (3.175, 0, 12.4084) (3.7769, 0, 21.3269) (15.7598, 0, 15.671) (21.348, 0, 3.6563) (12.4262, 0, 3.1048) (3.6361, 0, 3.6156) (3.175, 0, -12.4353) (3.6424, 0, -3.6631) (12.4172, 0, -3.2453) (21.3052, 0, -3.8974) (15.671, 0, -15.7598) (3.7769, 0, -21.3269)
properties part number "Wheel"
